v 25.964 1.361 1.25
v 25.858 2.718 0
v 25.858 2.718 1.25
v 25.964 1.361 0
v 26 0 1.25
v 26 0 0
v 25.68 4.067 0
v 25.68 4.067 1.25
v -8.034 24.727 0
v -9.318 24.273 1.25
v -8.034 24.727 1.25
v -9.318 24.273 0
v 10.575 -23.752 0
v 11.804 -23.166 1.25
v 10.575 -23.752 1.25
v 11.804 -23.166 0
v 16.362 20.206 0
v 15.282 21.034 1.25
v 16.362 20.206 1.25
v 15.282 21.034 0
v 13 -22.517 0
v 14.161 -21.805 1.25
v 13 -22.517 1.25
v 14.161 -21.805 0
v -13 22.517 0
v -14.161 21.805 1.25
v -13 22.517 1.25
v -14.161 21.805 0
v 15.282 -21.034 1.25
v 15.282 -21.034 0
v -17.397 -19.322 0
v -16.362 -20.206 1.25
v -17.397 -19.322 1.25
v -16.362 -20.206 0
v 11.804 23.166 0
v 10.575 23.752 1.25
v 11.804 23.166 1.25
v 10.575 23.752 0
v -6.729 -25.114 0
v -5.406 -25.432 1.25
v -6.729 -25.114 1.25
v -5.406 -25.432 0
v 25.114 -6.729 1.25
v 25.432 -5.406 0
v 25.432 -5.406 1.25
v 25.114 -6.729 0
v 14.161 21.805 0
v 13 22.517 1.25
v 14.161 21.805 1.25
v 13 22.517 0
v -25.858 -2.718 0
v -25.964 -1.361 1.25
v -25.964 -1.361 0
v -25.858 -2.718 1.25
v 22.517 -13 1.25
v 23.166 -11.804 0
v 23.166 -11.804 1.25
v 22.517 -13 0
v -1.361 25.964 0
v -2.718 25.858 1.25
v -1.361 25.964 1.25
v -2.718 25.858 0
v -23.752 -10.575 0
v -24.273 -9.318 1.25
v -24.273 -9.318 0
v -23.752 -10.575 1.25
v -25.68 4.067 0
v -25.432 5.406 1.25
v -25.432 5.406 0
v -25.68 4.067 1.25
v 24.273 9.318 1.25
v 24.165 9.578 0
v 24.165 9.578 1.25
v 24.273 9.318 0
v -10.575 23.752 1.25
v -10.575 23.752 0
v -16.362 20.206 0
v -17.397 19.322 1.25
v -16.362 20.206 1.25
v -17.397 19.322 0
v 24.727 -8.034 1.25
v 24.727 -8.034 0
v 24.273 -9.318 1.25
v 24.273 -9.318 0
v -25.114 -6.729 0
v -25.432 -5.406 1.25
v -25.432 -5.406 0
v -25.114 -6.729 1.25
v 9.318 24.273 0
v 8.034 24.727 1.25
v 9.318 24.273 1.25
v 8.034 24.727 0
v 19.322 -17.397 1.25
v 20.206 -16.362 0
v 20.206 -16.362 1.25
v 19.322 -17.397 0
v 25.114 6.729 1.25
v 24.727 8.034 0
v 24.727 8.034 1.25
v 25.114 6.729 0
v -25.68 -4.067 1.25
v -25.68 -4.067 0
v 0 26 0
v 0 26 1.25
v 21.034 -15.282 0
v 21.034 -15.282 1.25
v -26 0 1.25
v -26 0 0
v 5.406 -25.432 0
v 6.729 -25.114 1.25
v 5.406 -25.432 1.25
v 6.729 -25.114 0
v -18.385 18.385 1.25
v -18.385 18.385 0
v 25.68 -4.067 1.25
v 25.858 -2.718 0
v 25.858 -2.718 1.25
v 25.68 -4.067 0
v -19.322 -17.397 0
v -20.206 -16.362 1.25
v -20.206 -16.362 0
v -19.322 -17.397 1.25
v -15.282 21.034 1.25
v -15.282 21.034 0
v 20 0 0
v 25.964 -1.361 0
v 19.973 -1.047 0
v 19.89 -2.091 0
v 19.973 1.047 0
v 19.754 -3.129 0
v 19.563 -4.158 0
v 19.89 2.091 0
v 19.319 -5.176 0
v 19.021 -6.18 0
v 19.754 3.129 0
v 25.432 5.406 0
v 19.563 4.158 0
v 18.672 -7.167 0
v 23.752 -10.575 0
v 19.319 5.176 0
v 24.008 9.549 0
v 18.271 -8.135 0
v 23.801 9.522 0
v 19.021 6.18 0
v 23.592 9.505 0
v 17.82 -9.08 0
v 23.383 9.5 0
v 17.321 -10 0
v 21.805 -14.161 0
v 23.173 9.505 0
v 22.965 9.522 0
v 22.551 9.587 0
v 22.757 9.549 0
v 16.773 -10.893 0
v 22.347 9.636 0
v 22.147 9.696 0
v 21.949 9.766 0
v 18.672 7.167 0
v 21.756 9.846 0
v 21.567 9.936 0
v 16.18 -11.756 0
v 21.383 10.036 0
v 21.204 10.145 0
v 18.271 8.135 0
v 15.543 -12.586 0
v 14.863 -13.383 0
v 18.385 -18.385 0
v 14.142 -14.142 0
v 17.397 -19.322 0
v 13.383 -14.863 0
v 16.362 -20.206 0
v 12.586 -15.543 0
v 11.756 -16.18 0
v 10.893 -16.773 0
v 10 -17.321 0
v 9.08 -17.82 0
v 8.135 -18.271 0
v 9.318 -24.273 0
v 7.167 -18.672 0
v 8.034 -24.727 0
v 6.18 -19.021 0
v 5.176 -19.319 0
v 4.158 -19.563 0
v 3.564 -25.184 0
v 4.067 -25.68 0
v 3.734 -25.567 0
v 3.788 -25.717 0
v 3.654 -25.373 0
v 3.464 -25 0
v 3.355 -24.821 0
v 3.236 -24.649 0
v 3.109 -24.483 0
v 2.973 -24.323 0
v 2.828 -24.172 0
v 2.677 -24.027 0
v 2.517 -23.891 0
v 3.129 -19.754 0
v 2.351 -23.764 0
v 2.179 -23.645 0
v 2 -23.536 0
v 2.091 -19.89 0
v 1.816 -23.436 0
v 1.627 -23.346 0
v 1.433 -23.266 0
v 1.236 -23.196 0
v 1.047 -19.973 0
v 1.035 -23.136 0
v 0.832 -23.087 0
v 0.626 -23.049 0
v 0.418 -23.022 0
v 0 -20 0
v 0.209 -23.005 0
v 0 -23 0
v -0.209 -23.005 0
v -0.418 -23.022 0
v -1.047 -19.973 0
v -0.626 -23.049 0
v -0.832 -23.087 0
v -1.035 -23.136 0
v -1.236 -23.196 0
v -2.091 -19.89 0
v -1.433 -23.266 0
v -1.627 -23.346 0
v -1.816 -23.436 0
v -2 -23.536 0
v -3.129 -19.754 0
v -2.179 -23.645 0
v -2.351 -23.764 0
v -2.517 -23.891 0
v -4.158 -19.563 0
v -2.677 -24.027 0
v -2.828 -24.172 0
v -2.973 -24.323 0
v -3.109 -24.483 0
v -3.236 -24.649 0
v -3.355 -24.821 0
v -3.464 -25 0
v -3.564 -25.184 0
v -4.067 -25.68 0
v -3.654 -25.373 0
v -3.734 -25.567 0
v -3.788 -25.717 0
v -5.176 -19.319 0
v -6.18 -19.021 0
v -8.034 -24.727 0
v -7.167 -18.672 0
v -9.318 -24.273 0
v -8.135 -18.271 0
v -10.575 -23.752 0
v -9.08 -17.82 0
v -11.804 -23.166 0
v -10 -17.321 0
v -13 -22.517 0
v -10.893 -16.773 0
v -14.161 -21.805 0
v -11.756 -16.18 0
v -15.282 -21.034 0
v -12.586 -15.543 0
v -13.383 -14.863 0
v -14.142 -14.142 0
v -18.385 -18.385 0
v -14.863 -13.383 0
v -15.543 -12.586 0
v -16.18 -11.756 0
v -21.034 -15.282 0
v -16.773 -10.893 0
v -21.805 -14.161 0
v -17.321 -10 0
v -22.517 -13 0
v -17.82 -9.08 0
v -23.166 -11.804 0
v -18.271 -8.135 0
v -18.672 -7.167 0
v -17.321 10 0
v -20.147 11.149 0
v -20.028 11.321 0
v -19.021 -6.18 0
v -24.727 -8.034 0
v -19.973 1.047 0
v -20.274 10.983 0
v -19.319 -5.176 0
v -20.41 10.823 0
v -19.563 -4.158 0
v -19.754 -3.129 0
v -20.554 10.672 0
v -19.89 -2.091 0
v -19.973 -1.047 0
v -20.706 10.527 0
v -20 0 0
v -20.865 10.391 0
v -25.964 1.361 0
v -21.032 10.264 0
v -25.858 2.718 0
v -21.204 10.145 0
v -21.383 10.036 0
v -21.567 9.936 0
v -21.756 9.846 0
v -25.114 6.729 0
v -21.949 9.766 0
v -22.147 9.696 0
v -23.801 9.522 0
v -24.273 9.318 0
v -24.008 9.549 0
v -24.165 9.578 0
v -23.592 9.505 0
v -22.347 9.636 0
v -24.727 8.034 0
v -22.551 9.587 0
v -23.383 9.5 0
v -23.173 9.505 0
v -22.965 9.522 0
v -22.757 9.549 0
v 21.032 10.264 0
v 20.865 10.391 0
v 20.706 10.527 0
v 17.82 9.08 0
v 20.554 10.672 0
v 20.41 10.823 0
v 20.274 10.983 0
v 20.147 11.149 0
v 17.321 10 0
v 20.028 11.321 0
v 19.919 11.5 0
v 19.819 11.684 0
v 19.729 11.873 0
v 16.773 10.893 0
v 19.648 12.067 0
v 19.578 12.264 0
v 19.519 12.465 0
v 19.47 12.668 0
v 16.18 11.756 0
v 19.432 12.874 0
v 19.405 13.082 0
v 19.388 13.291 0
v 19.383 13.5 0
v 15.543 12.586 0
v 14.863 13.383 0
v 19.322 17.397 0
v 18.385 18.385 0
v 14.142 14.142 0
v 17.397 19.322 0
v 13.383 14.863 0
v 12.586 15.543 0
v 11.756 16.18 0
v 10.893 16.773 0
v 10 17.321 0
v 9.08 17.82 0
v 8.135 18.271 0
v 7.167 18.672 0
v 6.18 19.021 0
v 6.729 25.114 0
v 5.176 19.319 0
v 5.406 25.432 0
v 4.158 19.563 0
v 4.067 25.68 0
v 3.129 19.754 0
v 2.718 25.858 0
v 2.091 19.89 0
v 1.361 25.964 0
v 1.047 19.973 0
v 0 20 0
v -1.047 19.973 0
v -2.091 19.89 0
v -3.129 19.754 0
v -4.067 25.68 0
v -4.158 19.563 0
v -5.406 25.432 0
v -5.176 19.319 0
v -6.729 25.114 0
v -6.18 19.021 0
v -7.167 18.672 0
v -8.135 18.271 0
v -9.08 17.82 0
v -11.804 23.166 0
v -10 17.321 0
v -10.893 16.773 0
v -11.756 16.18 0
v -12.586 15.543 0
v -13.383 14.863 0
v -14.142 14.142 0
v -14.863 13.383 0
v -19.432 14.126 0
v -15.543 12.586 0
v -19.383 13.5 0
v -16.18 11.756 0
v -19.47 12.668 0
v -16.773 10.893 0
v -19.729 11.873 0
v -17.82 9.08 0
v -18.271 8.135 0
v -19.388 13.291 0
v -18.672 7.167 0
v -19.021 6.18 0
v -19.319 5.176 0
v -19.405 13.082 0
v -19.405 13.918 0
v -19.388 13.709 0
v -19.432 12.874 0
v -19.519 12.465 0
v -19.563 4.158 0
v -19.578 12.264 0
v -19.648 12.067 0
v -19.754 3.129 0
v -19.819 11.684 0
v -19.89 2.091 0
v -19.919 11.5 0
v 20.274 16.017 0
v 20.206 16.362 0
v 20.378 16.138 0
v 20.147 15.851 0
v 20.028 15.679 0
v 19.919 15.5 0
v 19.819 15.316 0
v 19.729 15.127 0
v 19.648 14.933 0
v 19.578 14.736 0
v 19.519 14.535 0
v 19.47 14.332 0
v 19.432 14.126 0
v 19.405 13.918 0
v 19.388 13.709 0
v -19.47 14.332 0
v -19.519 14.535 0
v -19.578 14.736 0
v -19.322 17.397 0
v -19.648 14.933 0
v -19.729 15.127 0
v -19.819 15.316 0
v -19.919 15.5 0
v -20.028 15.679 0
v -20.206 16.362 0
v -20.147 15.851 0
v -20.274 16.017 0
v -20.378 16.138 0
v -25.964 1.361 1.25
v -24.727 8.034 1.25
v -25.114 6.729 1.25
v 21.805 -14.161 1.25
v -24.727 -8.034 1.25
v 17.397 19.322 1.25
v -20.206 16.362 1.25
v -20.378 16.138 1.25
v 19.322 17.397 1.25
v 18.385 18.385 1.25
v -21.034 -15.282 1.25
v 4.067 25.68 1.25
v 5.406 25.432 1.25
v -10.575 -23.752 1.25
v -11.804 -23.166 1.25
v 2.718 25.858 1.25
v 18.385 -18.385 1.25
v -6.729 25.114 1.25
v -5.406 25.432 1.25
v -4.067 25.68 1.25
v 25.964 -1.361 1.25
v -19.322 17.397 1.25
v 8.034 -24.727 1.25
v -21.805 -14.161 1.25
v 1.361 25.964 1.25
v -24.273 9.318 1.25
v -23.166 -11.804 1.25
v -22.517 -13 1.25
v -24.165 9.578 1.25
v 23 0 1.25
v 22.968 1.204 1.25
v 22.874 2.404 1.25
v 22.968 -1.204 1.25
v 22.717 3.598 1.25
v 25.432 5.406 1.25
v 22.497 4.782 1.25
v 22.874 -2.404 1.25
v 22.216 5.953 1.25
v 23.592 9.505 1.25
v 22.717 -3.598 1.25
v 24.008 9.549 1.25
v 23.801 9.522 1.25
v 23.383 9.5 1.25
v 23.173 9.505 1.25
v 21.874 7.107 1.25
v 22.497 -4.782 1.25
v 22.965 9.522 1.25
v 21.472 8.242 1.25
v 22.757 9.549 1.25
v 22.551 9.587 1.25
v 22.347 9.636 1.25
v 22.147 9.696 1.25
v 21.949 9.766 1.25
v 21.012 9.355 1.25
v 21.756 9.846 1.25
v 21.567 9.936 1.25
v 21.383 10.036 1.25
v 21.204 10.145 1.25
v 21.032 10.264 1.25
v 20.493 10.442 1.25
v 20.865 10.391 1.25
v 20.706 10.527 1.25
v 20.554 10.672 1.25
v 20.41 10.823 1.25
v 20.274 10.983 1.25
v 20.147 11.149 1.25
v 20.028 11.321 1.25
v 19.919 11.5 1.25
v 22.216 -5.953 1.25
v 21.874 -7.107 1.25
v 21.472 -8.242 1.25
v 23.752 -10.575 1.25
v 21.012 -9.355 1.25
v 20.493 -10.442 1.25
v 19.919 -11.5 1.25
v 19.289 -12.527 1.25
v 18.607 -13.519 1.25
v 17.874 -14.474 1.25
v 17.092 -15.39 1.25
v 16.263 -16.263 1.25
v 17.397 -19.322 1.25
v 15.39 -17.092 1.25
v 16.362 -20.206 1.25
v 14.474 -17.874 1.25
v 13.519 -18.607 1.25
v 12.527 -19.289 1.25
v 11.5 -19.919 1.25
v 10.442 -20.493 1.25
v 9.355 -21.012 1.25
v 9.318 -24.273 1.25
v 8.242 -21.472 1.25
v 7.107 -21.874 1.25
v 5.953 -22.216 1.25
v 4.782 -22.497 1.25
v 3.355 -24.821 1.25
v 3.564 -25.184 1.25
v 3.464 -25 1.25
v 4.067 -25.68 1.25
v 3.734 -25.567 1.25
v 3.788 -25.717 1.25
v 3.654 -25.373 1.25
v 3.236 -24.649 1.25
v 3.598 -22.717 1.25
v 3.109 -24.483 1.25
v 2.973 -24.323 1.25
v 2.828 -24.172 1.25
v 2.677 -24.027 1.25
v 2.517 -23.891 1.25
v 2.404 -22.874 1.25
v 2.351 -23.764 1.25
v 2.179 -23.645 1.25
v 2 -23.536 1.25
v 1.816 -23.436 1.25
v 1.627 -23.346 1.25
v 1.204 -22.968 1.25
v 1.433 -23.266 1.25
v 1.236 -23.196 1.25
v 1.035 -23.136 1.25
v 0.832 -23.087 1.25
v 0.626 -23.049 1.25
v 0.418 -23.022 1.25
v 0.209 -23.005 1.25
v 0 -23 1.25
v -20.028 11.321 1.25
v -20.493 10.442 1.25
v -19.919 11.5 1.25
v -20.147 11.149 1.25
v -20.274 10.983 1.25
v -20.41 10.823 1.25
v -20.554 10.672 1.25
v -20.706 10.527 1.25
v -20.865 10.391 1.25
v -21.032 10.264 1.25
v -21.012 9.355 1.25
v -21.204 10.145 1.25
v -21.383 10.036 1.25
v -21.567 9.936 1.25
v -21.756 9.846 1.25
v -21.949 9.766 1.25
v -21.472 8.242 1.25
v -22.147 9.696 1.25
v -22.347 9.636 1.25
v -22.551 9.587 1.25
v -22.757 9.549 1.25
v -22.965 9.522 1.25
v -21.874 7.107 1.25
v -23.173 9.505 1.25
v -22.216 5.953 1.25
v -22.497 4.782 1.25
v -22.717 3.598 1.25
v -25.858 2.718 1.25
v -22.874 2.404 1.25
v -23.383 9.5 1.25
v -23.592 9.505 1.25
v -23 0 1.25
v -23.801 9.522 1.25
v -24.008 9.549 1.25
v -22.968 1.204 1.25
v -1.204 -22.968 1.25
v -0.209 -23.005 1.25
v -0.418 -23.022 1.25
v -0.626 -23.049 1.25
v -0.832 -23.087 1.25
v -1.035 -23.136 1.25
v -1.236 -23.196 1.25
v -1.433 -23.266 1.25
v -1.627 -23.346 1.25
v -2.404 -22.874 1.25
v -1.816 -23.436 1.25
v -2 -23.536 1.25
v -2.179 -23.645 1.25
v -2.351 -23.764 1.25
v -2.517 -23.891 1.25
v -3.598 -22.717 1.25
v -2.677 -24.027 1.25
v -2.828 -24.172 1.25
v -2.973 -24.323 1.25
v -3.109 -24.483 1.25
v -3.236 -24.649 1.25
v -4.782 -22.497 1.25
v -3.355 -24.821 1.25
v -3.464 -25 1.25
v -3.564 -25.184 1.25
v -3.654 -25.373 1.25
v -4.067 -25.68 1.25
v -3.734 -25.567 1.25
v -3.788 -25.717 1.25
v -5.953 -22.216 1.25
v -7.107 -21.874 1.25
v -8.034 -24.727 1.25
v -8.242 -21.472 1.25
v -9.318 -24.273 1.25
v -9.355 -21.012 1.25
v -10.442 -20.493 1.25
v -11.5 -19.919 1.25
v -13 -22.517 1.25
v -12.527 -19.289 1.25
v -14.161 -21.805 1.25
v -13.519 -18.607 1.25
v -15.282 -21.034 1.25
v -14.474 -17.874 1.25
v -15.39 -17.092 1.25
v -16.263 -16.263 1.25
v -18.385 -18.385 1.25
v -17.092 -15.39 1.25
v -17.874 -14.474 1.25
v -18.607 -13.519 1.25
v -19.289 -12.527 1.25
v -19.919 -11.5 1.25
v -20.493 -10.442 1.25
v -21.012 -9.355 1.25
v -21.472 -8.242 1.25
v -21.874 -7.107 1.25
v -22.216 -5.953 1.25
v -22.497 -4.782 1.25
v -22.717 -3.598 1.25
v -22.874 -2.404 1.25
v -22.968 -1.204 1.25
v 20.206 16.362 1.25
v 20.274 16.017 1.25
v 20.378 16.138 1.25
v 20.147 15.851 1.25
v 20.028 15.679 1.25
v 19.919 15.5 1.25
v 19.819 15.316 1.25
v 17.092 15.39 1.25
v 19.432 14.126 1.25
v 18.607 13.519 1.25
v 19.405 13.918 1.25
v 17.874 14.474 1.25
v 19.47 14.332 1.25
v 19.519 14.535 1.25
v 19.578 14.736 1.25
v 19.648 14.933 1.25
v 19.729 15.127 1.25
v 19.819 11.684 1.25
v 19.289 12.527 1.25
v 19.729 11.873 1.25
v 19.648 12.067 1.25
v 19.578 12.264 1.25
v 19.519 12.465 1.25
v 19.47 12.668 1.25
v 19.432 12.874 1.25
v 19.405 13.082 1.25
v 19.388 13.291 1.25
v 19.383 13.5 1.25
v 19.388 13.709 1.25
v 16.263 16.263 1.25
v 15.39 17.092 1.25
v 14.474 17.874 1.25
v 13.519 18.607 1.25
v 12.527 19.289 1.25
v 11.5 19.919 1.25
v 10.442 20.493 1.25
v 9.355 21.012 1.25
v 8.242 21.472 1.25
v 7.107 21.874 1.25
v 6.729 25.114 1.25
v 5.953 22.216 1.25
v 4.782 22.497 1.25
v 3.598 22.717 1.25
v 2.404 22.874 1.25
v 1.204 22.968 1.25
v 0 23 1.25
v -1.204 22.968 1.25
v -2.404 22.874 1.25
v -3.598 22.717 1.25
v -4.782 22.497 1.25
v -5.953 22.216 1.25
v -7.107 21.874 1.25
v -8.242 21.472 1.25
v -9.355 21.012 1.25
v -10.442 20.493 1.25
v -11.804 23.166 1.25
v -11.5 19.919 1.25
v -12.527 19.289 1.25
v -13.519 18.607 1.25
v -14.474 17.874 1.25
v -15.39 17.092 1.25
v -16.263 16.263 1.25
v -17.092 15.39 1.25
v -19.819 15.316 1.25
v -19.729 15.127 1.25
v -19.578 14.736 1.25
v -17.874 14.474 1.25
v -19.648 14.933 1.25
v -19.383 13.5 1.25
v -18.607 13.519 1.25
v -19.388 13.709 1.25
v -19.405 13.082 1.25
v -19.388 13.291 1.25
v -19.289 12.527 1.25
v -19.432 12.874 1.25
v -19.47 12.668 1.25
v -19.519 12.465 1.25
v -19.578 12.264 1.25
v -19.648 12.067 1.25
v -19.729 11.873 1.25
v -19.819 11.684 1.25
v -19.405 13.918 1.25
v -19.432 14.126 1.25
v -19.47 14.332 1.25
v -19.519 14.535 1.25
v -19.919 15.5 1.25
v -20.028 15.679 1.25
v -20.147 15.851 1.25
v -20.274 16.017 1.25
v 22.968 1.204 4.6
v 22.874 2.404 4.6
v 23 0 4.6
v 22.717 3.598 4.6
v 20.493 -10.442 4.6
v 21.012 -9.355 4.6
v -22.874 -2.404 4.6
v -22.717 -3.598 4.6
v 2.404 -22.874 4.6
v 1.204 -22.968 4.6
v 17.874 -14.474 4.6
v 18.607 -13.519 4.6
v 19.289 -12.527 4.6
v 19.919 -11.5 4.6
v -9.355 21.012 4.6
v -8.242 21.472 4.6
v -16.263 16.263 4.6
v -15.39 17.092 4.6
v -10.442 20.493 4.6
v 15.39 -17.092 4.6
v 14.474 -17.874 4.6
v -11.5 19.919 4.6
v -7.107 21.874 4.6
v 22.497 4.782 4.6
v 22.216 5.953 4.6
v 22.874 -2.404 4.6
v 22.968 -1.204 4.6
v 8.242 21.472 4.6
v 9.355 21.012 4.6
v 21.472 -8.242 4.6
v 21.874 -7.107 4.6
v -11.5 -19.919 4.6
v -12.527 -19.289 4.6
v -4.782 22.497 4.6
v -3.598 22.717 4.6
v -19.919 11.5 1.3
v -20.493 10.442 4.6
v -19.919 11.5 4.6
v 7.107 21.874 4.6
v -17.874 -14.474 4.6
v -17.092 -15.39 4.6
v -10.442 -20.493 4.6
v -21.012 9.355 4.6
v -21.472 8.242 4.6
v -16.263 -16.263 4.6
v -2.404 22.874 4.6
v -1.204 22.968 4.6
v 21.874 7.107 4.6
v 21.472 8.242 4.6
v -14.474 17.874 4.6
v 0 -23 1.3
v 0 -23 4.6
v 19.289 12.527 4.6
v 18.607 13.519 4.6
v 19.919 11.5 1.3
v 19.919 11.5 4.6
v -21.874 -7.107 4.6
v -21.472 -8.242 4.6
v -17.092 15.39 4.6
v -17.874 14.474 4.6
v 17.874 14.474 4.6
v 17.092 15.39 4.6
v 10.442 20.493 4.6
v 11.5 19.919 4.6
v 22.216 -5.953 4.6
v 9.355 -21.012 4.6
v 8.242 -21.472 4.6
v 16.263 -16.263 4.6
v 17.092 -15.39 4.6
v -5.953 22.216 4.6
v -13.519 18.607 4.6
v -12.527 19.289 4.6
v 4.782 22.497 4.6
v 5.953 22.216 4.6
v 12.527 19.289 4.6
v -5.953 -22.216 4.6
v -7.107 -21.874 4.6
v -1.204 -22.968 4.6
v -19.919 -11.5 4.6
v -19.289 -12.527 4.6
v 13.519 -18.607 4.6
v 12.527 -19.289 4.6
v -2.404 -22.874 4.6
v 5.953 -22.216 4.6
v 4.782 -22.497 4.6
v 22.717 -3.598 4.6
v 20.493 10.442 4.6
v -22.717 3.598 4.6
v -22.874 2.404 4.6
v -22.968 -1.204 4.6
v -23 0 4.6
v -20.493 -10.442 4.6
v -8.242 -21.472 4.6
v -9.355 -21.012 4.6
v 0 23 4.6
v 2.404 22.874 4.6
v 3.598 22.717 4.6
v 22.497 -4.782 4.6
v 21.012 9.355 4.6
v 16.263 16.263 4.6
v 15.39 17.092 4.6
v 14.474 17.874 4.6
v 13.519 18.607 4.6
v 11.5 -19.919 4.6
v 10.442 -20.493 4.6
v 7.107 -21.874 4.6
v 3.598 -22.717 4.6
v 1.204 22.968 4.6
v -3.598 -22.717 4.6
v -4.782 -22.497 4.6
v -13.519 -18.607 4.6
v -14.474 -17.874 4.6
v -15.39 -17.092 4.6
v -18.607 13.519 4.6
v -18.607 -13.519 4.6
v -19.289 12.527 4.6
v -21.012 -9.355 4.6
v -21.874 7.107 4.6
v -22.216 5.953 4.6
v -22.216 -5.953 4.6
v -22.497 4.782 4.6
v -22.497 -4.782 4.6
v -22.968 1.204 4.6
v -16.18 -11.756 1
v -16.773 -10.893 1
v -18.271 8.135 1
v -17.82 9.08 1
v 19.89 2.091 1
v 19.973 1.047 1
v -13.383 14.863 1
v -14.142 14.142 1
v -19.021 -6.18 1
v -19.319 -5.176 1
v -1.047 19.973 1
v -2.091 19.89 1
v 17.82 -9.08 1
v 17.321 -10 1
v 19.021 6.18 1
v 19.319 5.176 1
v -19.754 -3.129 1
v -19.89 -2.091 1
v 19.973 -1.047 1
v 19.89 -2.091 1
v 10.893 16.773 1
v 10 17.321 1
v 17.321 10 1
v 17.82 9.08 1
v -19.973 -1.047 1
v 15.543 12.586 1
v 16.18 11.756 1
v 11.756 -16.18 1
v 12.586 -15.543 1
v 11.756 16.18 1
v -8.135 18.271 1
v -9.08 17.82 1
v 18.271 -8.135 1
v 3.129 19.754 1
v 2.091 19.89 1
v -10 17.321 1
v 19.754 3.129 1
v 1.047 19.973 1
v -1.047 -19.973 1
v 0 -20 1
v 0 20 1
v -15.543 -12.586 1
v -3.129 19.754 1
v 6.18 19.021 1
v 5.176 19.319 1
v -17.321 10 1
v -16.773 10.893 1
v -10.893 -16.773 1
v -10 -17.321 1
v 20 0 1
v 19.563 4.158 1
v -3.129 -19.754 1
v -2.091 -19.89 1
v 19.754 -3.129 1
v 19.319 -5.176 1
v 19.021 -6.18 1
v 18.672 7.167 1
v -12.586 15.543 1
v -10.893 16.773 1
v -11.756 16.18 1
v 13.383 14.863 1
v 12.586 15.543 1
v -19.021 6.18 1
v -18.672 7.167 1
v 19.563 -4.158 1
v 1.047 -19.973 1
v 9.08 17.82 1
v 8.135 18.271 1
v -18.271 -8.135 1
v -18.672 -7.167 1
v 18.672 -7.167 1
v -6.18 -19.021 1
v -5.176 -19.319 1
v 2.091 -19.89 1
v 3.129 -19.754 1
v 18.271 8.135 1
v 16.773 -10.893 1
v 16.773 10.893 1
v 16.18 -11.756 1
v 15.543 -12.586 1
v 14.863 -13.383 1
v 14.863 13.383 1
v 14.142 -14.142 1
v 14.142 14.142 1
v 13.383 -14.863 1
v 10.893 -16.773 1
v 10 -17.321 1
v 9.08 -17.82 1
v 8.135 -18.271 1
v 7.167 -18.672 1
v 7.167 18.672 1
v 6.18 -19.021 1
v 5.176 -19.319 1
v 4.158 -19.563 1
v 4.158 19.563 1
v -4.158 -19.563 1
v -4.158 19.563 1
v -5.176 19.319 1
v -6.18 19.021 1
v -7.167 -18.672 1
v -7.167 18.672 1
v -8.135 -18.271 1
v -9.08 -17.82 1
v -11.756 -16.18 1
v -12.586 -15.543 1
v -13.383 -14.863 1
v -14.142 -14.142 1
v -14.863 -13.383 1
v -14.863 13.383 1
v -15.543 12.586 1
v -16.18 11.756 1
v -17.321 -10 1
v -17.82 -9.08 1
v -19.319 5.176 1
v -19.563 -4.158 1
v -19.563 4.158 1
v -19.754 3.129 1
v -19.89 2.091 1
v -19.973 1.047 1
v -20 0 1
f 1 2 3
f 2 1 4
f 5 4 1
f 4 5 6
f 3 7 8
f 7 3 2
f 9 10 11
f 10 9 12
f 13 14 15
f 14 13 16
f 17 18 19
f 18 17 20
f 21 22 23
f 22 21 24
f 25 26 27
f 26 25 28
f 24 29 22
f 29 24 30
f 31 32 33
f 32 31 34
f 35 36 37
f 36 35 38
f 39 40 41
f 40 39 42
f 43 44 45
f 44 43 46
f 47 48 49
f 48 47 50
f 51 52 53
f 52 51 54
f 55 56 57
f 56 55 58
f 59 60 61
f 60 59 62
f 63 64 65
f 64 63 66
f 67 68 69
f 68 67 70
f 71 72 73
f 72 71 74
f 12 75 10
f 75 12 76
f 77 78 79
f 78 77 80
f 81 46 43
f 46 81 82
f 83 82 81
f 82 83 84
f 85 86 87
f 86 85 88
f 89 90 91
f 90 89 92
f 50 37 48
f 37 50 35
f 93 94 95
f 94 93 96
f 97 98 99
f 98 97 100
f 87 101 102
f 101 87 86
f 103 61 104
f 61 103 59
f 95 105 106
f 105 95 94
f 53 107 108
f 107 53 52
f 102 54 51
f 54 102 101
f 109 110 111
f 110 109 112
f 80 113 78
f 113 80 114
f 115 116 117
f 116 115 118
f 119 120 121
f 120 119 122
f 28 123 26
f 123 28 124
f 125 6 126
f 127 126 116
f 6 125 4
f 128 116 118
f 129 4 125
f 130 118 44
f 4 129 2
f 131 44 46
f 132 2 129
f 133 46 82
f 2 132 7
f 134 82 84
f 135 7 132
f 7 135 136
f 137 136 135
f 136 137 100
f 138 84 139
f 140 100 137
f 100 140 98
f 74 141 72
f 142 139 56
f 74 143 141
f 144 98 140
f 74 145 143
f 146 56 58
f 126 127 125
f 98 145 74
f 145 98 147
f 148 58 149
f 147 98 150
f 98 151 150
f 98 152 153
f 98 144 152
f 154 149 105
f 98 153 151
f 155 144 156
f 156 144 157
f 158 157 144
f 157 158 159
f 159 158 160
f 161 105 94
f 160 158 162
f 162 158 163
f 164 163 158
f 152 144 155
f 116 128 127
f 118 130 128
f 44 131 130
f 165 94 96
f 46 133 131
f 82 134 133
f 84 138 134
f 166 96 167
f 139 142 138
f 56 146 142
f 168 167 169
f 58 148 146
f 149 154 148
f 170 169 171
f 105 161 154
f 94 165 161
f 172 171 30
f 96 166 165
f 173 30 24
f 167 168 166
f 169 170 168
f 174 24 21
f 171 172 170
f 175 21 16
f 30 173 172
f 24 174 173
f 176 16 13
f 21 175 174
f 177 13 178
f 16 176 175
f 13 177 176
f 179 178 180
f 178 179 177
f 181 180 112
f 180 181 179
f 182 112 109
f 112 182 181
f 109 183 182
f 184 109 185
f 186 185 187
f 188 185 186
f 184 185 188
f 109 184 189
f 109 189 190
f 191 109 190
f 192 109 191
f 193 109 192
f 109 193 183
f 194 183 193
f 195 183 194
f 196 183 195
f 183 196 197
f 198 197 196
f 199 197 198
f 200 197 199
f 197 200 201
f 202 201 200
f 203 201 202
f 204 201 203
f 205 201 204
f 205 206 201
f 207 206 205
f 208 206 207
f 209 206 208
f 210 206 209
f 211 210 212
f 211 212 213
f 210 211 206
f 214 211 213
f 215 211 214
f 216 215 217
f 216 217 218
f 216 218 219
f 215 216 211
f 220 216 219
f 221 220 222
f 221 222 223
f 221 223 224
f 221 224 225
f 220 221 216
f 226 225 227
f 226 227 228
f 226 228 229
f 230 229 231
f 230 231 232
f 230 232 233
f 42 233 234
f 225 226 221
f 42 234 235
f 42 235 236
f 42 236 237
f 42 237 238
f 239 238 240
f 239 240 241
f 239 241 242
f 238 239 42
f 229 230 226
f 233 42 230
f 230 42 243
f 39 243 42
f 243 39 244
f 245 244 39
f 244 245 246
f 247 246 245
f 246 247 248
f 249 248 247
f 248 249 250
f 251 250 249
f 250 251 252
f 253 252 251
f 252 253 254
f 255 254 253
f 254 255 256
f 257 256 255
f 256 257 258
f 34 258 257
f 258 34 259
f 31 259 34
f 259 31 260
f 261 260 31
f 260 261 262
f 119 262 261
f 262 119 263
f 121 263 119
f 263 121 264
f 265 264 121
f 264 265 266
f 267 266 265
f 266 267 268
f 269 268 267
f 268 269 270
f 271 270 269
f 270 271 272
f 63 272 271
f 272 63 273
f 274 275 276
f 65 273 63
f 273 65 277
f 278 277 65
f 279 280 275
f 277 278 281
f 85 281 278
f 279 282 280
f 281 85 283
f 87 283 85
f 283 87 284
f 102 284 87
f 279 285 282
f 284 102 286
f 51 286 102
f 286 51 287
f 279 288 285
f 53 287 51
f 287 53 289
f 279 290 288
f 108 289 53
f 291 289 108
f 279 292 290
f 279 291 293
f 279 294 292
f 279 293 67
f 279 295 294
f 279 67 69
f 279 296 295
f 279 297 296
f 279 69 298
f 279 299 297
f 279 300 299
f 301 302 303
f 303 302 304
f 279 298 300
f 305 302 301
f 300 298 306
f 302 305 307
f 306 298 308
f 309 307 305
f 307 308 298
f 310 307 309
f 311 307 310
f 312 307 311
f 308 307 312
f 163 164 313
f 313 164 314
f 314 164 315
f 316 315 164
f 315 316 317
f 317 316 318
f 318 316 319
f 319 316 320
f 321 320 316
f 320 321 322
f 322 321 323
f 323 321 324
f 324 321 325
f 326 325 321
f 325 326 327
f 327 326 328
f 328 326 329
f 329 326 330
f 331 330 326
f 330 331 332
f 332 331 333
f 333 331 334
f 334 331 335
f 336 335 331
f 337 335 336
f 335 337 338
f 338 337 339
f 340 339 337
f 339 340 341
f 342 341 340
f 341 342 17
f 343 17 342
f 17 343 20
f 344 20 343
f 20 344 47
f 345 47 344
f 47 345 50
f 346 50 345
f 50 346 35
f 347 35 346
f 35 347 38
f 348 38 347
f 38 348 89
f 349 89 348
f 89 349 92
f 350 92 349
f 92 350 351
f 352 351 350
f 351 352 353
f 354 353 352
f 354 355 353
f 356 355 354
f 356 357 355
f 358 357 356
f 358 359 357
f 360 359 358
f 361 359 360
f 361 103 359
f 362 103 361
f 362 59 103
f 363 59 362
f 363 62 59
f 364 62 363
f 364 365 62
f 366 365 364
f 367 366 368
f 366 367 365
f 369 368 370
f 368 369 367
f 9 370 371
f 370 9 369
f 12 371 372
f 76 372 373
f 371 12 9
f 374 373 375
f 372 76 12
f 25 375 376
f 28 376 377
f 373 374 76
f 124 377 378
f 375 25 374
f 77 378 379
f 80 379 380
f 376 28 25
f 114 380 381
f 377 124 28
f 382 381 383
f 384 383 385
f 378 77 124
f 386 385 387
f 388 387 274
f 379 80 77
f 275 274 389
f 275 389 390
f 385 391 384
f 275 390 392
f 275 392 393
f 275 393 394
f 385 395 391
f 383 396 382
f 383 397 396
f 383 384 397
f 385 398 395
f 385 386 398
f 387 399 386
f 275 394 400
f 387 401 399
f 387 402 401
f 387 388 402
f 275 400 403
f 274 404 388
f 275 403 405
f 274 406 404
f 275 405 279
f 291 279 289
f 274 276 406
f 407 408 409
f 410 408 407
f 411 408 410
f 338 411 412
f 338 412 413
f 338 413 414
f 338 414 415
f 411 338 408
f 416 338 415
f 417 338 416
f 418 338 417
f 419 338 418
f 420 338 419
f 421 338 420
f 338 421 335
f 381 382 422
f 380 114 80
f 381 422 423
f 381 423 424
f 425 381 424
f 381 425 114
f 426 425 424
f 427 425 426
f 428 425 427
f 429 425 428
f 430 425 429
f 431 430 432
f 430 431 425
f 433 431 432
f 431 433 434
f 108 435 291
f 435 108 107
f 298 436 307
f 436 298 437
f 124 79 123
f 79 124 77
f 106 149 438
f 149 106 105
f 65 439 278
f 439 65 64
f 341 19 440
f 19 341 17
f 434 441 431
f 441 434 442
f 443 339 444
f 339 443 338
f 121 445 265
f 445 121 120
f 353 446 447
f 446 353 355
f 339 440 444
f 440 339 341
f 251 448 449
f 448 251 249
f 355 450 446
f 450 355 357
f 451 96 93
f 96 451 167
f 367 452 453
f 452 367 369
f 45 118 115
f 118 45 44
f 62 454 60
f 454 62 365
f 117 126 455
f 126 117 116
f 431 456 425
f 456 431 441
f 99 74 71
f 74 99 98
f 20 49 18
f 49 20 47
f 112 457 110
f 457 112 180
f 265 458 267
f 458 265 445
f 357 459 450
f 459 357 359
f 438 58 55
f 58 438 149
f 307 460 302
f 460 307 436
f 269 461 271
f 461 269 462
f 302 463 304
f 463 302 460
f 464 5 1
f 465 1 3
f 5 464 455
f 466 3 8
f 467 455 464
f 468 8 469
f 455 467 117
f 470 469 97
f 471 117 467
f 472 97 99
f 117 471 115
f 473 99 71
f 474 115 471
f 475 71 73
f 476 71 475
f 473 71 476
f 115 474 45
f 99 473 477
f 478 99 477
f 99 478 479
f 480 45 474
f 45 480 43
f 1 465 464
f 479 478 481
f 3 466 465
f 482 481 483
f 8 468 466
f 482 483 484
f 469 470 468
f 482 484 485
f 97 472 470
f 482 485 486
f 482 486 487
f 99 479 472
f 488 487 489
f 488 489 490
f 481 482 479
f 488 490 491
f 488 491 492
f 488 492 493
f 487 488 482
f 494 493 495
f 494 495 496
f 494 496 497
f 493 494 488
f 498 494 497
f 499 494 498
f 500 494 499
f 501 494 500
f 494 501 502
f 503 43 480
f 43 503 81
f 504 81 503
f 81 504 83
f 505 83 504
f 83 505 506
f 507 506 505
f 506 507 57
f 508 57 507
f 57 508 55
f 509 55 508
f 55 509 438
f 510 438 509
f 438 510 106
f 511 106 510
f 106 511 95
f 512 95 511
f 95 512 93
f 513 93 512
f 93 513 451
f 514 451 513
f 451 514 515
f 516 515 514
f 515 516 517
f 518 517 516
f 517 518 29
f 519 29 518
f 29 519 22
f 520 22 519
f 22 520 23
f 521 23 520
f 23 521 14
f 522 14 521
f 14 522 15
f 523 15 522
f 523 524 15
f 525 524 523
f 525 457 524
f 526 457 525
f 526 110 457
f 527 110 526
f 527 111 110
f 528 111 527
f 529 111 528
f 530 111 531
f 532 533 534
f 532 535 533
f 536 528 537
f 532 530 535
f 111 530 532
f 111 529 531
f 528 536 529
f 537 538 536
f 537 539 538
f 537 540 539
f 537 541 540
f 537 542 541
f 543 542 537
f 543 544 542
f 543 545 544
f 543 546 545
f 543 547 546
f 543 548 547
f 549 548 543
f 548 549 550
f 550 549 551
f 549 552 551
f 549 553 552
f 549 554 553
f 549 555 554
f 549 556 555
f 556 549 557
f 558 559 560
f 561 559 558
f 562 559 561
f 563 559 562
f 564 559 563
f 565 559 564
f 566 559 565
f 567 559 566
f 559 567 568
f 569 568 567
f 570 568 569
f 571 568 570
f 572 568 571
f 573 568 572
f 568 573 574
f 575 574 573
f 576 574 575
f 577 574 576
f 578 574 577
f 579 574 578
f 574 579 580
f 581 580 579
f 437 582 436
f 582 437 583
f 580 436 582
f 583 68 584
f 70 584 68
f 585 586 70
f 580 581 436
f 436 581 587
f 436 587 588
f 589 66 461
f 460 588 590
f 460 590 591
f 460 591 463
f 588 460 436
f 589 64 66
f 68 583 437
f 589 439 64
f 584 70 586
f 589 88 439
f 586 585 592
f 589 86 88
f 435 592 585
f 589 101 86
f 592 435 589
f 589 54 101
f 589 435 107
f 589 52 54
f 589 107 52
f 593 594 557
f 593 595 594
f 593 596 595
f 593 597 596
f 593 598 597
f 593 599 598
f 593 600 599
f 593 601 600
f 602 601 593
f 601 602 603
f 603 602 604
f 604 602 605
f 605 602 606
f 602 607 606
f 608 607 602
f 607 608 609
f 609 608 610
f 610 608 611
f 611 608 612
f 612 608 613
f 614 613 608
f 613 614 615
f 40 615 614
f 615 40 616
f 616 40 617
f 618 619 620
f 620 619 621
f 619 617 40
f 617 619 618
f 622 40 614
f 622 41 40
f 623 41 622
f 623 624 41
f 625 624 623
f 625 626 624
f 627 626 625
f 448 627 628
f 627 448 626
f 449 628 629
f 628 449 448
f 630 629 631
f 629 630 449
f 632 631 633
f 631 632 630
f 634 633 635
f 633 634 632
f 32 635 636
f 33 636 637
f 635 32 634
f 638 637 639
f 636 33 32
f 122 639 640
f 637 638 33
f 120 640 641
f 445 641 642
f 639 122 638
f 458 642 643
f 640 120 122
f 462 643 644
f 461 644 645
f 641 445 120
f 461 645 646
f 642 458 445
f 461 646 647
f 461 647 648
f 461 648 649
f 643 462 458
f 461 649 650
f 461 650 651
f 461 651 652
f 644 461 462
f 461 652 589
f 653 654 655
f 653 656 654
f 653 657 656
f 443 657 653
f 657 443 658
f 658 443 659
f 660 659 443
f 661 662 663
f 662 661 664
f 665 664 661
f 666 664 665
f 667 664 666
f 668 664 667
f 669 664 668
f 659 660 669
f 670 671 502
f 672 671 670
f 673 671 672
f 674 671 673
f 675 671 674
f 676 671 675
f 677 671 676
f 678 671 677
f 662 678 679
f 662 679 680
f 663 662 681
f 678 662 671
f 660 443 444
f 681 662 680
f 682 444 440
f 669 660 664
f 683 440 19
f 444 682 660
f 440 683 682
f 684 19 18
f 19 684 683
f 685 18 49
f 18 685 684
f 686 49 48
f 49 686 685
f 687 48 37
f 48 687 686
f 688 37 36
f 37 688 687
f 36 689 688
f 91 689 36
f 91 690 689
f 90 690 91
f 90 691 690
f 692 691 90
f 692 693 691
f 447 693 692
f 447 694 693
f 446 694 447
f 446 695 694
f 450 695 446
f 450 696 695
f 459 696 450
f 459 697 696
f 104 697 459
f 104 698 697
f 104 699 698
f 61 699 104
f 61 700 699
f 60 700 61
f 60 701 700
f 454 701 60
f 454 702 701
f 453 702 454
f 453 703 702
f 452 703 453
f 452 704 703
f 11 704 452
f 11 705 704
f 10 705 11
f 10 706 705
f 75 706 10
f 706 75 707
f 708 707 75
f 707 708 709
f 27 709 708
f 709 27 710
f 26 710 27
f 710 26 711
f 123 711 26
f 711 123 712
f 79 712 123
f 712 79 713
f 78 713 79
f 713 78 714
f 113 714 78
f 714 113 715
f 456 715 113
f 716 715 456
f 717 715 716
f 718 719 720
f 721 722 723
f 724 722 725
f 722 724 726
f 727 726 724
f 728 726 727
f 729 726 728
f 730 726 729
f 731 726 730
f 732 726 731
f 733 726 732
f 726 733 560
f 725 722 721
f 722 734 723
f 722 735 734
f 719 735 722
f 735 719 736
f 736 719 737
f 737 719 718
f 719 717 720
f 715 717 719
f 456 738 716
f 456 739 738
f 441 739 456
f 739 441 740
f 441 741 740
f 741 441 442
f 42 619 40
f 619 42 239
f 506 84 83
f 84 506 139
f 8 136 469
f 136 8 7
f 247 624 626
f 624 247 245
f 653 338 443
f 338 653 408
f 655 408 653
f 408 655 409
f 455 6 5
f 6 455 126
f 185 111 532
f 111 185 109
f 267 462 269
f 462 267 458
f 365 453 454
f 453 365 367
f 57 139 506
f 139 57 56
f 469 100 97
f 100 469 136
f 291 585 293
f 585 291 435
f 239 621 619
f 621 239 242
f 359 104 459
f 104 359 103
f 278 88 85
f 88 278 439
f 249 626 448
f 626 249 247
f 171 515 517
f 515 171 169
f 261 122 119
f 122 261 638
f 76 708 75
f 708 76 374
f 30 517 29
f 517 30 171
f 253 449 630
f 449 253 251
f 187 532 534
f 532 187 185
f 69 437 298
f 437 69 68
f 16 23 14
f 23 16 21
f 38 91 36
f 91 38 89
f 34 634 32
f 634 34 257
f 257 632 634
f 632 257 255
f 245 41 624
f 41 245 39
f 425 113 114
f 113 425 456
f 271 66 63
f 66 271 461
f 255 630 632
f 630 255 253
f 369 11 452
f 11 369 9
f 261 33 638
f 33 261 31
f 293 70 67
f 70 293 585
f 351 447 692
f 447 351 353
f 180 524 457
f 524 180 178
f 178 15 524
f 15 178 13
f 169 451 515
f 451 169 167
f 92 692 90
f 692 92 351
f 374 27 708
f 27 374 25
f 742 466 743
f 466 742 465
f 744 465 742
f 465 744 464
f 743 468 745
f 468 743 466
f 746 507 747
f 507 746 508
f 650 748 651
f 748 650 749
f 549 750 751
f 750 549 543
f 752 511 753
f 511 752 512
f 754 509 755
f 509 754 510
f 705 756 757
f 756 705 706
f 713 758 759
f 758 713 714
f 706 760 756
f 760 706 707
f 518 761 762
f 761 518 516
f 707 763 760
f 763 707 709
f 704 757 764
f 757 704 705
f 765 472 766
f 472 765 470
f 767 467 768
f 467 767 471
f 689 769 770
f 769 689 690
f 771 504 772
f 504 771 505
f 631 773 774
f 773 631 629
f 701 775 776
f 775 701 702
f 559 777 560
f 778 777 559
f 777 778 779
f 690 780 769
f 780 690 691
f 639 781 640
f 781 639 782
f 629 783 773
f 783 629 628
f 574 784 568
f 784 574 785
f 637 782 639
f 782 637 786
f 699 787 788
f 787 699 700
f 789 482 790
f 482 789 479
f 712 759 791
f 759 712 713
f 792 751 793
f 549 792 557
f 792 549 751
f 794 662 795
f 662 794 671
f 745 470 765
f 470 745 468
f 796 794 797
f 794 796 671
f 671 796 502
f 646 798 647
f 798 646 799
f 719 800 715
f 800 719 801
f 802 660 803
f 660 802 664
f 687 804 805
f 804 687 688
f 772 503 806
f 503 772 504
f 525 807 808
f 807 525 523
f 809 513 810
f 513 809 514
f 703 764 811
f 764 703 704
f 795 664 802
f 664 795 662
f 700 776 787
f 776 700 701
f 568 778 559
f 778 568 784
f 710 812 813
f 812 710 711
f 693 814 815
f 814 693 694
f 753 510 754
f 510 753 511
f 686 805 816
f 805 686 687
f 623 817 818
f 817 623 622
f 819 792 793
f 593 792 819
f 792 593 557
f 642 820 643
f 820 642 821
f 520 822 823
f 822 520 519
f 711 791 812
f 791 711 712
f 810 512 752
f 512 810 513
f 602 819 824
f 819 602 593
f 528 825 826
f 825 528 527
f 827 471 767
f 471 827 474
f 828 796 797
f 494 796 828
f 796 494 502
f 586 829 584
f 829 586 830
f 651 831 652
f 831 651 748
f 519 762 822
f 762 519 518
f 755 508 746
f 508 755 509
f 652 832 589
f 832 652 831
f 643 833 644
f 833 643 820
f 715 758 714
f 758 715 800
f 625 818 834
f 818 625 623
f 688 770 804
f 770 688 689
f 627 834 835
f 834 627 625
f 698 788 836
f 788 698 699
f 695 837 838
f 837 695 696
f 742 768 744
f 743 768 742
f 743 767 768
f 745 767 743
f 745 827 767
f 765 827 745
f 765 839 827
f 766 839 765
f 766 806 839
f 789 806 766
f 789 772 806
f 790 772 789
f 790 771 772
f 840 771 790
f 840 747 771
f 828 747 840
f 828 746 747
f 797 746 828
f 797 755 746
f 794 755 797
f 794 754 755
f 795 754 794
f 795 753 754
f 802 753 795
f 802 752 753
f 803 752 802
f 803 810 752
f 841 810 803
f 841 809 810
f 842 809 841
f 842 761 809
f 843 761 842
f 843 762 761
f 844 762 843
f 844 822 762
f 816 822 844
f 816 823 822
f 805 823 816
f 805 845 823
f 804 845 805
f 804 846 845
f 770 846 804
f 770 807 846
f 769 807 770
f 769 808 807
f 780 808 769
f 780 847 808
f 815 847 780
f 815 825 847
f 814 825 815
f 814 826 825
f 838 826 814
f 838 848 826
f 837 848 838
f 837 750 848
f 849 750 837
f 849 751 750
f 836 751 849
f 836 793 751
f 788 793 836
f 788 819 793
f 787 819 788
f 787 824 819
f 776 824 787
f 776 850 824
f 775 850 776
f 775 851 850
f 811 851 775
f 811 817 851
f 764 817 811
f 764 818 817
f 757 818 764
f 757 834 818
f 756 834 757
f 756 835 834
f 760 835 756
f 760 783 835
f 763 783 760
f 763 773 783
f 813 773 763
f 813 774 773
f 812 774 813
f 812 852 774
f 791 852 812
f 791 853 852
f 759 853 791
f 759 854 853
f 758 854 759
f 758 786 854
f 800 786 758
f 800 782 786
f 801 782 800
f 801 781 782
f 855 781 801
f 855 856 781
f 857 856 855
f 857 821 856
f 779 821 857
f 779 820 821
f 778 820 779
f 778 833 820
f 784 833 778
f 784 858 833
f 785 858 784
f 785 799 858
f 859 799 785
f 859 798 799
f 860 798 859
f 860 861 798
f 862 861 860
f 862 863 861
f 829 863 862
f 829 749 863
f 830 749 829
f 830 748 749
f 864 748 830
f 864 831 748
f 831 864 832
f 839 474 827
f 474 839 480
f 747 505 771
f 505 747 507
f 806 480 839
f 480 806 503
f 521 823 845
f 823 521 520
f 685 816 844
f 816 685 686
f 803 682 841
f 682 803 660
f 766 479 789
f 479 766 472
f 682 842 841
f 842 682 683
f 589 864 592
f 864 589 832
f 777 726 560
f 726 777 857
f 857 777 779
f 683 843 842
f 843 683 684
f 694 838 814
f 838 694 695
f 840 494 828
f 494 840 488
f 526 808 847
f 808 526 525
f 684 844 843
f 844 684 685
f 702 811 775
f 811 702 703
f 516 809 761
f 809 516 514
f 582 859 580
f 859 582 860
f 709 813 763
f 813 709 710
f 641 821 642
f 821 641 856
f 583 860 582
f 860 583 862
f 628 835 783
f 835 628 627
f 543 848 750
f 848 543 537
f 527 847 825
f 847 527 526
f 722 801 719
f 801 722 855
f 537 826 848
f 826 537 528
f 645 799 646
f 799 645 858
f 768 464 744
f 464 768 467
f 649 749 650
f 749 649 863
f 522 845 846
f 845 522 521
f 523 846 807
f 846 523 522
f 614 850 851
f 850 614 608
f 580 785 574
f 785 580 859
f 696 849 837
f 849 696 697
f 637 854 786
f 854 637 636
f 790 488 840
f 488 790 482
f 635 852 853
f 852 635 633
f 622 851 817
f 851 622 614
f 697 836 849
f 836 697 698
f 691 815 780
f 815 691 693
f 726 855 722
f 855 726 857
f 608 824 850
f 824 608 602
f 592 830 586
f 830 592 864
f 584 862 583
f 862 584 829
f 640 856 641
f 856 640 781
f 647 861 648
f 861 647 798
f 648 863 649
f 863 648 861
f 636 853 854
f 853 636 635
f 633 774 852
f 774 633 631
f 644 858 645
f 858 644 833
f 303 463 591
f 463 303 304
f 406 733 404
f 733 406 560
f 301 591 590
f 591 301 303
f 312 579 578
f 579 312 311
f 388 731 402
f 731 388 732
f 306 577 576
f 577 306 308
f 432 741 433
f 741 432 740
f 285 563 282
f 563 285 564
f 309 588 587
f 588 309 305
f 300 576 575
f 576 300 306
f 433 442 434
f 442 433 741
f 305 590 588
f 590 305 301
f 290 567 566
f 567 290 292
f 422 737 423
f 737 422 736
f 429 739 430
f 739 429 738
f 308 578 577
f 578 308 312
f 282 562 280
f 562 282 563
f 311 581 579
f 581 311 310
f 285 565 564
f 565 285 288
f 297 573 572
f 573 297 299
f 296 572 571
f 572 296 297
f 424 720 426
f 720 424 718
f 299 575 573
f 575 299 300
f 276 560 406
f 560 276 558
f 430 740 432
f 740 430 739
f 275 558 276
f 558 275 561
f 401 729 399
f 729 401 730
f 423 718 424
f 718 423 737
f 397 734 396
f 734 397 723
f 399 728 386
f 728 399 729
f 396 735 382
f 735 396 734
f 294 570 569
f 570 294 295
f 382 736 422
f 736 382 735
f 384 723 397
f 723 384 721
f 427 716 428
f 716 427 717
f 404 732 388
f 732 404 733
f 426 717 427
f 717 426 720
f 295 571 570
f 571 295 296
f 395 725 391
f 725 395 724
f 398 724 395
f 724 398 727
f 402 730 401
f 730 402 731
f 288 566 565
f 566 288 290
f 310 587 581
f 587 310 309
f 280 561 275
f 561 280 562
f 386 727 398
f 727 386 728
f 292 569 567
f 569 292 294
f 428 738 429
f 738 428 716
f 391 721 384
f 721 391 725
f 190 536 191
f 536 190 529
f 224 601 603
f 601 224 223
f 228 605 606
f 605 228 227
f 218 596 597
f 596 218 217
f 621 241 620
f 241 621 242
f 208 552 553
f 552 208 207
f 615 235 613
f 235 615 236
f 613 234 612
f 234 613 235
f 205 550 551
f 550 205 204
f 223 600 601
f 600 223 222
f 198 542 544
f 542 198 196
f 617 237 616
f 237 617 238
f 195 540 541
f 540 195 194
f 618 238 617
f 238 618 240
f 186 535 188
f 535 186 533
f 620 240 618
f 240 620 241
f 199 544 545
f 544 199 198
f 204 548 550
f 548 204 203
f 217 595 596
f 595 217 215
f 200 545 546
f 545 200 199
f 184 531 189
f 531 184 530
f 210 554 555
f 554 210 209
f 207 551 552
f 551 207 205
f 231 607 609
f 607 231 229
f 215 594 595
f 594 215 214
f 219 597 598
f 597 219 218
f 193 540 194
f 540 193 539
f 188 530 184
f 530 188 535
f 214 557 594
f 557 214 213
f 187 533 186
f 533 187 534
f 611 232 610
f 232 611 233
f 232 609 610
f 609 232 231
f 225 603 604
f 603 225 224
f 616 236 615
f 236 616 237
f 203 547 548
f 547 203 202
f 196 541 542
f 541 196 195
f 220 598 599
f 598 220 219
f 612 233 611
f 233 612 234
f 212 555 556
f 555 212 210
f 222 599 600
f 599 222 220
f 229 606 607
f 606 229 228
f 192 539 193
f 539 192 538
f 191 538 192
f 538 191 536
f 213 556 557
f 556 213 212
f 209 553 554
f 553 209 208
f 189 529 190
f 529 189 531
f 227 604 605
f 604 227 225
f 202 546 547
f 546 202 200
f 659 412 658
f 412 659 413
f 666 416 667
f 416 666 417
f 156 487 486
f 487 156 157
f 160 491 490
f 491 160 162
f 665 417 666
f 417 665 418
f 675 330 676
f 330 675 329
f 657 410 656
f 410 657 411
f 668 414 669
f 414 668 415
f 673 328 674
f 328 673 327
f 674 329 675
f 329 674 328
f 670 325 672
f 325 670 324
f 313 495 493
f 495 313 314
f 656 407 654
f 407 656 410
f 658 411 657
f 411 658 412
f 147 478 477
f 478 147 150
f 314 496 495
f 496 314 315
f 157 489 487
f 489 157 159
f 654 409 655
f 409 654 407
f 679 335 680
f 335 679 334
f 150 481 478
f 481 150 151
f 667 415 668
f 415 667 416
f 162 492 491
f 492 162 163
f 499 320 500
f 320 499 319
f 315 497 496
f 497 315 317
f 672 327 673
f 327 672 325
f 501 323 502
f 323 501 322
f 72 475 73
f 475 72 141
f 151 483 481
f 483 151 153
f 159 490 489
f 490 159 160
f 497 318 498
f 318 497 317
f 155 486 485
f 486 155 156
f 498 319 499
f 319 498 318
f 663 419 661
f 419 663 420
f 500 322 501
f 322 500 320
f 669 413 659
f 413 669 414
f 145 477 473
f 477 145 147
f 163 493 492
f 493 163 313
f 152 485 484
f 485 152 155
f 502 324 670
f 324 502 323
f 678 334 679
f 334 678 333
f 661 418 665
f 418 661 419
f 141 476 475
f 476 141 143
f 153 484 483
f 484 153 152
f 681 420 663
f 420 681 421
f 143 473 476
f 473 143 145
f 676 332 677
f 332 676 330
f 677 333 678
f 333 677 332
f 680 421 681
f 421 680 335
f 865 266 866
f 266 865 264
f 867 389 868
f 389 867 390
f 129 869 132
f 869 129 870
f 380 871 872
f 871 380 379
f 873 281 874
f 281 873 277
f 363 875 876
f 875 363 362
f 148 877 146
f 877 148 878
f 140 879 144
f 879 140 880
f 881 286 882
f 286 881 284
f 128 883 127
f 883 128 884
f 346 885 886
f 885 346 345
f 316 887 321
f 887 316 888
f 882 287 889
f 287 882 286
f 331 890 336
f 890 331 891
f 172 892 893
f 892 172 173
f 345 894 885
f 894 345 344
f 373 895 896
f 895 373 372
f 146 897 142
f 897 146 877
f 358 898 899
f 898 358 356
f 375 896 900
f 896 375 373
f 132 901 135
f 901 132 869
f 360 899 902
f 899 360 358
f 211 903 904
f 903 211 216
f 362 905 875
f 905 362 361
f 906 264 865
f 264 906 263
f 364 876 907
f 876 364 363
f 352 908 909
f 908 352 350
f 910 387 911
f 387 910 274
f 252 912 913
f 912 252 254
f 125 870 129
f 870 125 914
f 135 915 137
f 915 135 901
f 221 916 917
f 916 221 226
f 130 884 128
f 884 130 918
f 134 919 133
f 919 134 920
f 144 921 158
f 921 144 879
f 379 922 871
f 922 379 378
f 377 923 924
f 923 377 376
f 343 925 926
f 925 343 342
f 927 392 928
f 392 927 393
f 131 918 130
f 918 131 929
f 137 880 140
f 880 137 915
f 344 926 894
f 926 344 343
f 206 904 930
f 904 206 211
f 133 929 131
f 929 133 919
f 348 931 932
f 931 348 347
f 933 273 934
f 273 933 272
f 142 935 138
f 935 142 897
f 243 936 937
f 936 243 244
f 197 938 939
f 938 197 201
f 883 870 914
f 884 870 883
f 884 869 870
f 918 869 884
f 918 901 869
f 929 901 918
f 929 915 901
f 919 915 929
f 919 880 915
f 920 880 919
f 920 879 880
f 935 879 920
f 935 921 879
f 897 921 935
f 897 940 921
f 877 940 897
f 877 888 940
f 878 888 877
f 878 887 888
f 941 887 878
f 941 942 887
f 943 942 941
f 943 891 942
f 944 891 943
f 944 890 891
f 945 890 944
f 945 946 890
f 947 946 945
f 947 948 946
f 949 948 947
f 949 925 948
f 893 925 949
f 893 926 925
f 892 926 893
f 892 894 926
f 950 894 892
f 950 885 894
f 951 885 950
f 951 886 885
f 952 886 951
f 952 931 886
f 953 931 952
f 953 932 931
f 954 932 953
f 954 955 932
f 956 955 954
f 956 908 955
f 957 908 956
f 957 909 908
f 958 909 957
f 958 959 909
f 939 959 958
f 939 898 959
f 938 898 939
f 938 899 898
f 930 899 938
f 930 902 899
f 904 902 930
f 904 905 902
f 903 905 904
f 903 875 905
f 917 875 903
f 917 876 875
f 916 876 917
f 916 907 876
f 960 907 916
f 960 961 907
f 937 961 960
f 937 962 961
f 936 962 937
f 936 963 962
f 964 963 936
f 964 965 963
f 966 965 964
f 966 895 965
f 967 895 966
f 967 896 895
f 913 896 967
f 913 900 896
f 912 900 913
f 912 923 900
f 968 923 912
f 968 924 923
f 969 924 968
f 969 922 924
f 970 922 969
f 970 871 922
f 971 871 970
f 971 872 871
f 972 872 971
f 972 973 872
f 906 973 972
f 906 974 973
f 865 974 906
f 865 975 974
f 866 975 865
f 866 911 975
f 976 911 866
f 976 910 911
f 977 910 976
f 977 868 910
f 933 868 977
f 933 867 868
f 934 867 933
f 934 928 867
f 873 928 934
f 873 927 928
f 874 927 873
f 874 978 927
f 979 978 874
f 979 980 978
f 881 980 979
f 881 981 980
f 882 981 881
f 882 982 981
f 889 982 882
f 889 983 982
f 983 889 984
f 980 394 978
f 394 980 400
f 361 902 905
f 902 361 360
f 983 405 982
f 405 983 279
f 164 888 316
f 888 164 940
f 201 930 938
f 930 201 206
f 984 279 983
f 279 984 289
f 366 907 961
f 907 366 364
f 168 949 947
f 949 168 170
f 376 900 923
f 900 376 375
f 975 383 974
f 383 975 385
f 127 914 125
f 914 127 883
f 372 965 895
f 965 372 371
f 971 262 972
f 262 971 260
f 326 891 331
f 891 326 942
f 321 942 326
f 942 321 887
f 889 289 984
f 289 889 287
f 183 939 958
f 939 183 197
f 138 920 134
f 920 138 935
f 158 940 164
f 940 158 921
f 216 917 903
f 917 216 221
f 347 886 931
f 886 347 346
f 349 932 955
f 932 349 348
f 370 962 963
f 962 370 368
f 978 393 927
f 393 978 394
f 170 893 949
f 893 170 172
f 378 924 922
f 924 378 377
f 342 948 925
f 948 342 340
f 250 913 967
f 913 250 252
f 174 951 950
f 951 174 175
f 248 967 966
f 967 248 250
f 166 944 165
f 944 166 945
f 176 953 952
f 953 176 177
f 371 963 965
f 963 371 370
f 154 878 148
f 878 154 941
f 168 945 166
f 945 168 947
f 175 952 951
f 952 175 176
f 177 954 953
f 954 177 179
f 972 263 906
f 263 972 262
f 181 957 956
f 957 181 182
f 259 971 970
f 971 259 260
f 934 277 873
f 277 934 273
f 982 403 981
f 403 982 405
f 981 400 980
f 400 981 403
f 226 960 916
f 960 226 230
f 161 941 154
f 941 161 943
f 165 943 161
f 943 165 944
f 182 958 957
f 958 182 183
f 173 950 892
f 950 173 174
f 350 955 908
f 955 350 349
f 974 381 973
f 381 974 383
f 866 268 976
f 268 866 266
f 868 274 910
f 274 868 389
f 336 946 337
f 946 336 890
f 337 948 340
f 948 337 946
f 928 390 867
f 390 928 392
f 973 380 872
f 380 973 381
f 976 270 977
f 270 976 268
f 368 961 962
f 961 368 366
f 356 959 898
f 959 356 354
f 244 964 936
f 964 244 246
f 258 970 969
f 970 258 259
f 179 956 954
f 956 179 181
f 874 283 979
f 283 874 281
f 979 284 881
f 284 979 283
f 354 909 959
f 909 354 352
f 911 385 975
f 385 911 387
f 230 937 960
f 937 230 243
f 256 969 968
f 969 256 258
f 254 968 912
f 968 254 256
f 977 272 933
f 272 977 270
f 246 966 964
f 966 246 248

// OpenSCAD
// file: design.scad
include <../assets/common.scad>

// ---------------------------------------------------------
// FACETED PARAMETERS ($fn=8)
// ---------------------------------------------------------

oct_r = outer_r / cos(180 / 8); // Circumscribed radius so inner wall clearance is preserved

// ---------------------------------------------------------
// BASE
// ---------------------------------------------------------

module faceted_base_body() {
  // Octagonal base with a clean bottom 45-degree chamfer
  chamfer_h = 1.6;
  hull() {
    translate([0, 0, 0])
      cylinder(r = oct_r - chamfer_h, h = eps, $fn = 8);
    translate([0, 0, chamfer_h])
      cylinder(r = oct_r, h = eps, $fn = 8);
    translate([0, 0, seat_z])
      cylinder(r = oct_r, h = eps, $fn = 8);
  }
}

module faceted_base() {
  difference() {
    faceted_base_body();

    // Internal cavities from common.scad
    translate([0, 0, floor_t])
      linear_extrude(battery_d + eps + 10)
        battery_2d();
    translate([0, 0, pcb_z - xiao_d])
      linear_extrude(xiao_d + eps)
        xiao_2d();
    translate([0, 0, pcb_z])
      linear_extrude(seat_z - pcb_z + eps)
        offset(delta = pcb_gap) board_2d();

    usb_tunnel();
    wire_notch();
    screw_pilots();
  }
  pcb_tabs();
}

// ---------------------------------------------------------
// CLAMP
// ---------------------------------------------------------

module faceted_clamp_body() {
  // Chamfered / low-poly faceted top ring
  // Slopes down from the inner circular opening to the octagonal perimeter
  bevel_drop = 1.8;

  hull() {
    // Outer perimeter octagon at clamp baseline
    translate([0, 0, 0])
      cylinder(r = oct_r, h = clamp_h - bevel_drop, $fn = 8);

    // Inner rim apex circle surrounding the button opening
    translate([0, 0, clamp_h - eps])
      cylinder(r = opening_r + 1.2, h = eps, $fn = 16);
  }
}

module faceted_clamp() {
  difference() {
    faceted_clamp_body();

    // Flange movement cavity
    translate([0, 0, -eps])
      difference() {
        cylinder(r = flange_clear_r, h = lip_z + eps);
        for (a = screw_angles)
          rotate([0, 0, a])
            translate([screw_r, 0, 0])
              translate([0, 0, -eps])
                cylinder(d = screw_clear_d + 4, h = clamp_h);
      }

    // Circular button pass-through opening
    translate([0, 0, lip_z - eps])
      cylinder(r = opening_r, h = lip_t + 2 * eps);

    // Screw clearance bores
    screw_clearance();
  }
}

// ---------------------------------------------------------
// BUTTON
// ---------------------------------------------------------

module faceted_button() {
  button_solid();
}
// main file
// Center cap. Stem tip on the bed, flat face up.
// The flange is wider than the stem: turn on supports from the build plate only.
//   openscad -o button.stl button.scad
include <design.scad>

$fn = 120;

translate([0, 0, -tip_rest])
  faceted_button();
